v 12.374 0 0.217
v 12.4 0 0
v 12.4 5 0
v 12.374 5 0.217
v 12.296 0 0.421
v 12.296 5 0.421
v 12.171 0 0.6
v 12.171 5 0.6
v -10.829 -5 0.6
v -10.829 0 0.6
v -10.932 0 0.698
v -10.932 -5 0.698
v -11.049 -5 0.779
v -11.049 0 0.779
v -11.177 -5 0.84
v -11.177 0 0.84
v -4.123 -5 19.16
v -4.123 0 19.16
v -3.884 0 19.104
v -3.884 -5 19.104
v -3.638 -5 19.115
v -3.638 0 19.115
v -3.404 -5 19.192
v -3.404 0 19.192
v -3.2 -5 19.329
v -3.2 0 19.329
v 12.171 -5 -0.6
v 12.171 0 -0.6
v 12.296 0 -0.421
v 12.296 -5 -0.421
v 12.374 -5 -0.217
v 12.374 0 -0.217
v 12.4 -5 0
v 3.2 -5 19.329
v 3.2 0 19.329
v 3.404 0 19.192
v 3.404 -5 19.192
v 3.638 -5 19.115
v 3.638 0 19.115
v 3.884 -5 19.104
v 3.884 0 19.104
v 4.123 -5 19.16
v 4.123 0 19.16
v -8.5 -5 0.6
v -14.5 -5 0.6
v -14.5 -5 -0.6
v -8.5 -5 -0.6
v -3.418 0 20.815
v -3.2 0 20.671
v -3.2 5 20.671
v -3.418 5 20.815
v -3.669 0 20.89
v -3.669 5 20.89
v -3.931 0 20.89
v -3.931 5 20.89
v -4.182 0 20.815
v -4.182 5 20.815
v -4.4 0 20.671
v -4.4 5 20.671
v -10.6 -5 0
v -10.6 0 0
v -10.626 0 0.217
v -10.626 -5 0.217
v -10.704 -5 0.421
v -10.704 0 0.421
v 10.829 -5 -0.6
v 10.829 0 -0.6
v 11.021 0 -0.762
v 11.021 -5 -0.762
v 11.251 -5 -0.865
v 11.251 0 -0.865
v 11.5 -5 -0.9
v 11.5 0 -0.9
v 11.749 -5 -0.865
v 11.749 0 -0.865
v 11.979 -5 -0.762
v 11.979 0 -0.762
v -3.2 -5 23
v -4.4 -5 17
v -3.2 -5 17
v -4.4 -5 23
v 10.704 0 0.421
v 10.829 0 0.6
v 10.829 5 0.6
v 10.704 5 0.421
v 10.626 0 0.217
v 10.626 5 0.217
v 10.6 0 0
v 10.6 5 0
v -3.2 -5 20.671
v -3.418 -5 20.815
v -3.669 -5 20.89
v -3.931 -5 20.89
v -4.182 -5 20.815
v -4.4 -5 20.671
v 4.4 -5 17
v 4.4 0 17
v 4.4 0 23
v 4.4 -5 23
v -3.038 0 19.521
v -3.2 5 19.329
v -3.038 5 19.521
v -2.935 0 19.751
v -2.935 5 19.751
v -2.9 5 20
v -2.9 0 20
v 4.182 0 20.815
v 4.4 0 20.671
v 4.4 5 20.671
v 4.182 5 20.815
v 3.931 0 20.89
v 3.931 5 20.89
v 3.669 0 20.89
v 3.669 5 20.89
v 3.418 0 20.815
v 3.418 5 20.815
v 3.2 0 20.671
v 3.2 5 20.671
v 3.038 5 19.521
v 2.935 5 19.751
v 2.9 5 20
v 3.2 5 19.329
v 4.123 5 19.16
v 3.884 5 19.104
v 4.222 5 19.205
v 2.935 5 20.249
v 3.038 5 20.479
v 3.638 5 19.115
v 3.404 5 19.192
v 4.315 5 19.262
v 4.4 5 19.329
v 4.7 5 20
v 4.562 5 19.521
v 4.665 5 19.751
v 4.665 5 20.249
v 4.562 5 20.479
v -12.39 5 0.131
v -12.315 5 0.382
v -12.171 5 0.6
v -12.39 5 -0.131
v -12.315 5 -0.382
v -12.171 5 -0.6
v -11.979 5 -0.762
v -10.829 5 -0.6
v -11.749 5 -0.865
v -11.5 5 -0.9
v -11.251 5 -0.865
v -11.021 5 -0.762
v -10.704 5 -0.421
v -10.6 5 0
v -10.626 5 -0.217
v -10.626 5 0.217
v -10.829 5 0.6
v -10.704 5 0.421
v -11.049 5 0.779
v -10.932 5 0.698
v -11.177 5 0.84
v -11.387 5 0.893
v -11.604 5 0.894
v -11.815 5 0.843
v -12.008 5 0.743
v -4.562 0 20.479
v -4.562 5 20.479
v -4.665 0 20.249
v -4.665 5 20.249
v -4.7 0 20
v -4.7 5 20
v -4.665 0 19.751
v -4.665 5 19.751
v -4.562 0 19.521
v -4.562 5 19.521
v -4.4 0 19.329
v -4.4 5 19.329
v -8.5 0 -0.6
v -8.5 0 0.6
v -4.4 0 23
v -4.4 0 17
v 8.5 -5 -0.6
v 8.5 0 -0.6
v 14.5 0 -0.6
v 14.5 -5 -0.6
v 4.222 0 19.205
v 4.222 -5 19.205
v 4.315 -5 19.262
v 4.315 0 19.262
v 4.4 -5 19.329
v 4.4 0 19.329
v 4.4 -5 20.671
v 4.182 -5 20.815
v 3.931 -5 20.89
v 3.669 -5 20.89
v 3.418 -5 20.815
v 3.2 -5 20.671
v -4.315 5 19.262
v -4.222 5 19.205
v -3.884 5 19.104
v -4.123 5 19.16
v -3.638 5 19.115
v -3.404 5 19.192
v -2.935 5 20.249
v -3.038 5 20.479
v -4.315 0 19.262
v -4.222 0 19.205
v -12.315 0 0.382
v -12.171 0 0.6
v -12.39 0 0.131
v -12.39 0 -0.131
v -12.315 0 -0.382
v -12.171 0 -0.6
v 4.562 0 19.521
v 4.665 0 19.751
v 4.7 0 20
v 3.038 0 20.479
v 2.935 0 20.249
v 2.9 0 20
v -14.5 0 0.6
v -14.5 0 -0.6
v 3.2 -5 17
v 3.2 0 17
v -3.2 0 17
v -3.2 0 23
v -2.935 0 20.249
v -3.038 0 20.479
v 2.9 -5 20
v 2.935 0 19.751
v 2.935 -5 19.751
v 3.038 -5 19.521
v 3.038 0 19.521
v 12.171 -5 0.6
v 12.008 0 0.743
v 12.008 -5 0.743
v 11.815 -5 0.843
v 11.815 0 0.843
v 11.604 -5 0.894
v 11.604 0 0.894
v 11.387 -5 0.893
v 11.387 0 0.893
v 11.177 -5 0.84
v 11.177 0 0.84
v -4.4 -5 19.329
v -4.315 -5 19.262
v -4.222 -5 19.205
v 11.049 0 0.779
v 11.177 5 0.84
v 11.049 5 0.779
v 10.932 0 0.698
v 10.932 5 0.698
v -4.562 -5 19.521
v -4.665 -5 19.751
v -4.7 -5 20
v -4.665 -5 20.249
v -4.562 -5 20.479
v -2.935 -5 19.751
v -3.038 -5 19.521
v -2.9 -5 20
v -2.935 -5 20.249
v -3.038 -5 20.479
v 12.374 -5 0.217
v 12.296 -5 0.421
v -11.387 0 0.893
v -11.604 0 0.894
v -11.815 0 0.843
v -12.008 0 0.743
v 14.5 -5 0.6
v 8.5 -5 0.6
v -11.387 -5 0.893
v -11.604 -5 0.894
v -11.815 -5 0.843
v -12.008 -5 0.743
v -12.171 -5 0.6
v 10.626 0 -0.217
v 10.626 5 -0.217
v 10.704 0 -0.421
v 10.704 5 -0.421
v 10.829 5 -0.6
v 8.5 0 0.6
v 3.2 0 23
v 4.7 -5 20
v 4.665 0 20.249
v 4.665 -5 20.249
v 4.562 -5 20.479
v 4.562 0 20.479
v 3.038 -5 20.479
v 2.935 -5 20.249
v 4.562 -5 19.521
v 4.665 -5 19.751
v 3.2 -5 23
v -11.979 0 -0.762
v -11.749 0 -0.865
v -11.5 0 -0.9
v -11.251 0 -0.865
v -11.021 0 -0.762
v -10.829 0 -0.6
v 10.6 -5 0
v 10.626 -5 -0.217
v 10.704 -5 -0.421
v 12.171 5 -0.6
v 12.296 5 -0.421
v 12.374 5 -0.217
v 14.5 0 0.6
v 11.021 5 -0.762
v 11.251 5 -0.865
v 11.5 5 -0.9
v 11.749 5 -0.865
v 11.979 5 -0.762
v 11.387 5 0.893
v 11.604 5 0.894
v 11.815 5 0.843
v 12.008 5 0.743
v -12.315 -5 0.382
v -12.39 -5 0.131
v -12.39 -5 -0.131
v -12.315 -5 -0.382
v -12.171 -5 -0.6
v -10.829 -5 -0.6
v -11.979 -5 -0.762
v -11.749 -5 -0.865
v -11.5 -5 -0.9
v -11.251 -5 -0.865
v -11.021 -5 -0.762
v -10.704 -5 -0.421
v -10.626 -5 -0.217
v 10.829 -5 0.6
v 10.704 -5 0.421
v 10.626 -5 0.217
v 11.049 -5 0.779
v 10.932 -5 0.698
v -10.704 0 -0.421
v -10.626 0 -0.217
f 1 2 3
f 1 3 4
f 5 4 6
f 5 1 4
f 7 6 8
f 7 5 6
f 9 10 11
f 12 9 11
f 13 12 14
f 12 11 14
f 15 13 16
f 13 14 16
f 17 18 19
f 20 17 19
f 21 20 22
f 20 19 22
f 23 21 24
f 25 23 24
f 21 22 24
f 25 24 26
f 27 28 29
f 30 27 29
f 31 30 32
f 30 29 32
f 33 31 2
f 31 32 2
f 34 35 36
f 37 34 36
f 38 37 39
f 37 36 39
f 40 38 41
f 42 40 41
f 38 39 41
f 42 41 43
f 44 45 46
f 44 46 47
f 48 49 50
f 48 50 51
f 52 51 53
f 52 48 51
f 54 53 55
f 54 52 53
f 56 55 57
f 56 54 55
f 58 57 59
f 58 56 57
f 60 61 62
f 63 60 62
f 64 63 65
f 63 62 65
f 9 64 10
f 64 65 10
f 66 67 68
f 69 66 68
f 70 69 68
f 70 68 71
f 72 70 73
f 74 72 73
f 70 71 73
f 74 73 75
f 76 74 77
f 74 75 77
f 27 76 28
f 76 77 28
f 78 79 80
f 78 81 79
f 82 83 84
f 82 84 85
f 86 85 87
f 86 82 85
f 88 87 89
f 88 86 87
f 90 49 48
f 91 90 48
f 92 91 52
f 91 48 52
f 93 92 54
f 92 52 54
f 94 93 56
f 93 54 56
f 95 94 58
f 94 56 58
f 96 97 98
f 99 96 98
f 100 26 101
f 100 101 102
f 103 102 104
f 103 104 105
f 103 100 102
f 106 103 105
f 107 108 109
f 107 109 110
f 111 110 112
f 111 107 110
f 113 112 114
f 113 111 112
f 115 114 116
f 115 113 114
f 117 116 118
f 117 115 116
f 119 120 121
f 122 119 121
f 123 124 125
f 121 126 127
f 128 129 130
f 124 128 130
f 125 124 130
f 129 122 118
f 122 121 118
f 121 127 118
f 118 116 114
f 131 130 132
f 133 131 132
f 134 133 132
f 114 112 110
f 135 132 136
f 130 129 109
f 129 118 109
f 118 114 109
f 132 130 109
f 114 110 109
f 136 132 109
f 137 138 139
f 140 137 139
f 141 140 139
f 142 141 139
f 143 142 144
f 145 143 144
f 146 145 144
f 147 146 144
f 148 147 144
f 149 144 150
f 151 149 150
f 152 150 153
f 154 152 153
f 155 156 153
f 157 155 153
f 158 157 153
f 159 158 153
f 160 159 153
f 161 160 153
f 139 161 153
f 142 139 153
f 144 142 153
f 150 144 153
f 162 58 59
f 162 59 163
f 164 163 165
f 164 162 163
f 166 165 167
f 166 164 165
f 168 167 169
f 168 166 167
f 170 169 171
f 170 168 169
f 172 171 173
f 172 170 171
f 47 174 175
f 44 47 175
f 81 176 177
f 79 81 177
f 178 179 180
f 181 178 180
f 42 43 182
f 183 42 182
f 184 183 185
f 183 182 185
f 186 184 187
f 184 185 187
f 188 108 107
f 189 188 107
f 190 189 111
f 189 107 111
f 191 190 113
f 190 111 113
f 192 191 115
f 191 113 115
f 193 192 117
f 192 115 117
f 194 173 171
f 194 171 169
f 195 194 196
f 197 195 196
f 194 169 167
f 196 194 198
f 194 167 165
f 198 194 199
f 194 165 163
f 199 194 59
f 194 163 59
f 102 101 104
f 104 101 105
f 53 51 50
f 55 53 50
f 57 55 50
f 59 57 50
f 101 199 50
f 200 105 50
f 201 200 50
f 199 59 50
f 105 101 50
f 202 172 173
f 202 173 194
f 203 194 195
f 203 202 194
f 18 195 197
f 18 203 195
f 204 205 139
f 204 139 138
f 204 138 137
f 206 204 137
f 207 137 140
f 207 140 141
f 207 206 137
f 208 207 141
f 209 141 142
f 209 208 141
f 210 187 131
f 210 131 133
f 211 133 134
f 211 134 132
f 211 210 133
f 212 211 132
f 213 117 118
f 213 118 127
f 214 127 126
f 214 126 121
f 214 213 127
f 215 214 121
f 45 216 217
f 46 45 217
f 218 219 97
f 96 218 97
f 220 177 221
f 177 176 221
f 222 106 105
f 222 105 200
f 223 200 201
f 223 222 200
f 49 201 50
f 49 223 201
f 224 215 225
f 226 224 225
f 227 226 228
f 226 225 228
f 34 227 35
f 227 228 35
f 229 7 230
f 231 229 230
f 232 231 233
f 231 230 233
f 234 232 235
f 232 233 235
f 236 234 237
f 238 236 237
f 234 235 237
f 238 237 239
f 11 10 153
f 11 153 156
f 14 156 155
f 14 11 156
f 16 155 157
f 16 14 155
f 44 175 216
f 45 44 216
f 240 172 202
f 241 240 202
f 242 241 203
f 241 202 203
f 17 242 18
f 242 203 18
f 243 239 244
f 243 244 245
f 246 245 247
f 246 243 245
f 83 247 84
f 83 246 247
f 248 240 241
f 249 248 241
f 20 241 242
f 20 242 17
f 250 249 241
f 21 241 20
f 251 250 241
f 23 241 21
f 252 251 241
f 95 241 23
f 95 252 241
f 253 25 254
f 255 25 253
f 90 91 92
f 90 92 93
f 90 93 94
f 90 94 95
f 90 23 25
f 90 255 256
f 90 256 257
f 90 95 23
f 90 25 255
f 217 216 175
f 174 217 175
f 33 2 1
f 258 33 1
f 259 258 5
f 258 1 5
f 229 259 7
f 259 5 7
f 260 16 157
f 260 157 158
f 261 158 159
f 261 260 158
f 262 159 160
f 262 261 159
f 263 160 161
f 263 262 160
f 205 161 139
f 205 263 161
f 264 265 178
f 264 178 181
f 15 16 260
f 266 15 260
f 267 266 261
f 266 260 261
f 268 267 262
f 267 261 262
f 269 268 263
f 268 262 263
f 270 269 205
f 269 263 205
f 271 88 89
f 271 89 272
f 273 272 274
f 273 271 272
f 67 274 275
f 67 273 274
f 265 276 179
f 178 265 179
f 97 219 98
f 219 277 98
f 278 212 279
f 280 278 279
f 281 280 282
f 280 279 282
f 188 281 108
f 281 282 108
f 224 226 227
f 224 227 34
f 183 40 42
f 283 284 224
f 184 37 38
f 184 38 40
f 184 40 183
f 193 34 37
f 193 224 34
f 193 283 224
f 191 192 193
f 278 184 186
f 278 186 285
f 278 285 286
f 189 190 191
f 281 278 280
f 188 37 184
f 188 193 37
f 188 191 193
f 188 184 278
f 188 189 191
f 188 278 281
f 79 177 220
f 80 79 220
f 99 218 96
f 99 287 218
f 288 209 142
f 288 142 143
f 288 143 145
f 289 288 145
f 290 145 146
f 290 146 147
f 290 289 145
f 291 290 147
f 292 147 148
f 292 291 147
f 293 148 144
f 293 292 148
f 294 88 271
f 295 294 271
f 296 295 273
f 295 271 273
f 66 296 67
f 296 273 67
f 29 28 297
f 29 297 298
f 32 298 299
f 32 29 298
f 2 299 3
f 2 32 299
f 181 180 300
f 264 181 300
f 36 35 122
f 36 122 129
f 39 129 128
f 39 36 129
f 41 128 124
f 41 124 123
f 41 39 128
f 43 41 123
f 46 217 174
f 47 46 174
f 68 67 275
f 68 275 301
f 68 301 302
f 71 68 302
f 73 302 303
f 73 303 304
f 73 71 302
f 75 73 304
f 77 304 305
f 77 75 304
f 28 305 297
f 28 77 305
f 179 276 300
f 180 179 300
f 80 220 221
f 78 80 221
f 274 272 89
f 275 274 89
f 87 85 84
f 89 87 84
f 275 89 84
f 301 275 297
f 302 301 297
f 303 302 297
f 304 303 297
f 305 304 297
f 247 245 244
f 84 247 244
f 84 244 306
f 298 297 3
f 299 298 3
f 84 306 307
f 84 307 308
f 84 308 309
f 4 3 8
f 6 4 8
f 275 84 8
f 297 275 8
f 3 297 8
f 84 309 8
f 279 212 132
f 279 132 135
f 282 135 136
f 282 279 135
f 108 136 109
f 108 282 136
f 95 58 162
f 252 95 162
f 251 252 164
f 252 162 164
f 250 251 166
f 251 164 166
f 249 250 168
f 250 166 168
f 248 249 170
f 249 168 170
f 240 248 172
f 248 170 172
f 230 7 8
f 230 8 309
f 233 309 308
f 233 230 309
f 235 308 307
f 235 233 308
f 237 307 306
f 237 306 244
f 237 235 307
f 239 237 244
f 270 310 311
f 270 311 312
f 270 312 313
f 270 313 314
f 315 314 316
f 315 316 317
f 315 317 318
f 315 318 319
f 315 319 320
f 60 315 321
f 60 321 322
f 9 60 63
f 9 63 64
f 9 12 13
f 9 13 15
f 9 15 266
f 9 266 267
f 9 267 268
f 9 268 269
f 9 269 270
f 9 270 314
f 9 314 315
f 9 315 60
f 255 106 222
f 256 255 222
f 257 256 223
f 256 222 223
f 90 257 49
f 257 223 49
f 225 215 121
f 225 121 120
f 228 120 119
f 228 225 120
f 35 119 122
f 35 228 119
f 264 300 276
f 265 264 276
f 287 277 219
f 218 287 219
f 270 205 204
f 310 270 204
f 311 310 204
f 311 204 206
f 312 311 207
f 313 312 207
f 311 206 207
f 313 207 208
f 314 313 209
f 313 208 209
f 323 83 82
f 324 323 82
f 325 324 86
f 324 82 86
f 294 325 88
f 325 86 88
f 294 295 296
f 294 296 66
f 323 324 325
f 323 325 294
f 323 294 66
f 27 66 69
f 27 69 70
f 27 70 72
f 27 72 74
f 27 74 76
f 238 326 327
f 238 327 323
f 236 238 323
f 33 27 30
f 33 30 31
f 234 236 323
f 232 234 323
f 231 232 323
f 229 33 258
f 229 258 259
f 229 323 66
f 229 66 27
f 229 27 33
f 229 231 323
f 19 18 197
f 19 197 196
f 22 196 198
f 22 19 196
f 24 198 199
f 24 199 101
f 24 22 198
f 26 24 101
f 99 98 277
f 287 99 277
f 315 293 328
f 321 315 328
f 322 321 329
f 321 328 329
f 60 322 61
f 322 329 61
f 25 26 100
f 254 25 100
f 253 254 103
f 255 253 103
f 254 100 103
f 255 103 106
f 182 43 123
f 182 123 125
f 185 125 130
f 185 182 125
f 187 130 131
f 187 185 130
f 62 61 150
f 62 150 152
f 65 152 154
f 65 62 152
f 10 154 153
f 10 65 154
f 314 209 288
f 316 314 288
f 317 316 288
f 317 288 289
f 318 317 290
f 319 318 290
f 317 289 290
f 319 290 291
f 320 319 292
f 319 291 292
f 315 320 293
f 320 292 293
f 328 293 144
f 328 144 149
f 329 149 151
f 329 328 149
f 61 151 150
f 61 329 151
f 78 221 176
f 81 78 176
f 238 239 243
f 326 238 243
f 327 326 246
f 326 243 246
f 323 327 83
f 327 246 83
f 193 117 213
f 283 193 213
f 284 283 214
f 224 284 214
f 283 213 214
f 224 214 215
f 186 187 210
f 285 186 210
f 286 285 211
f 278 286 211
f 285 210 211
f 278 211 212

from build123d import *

# Parameters (mm, degrees)
F1_DEPTH      = 5
F1_DEPTH_BACK = 5
F2_DEPTH      = 5


with BuildPart() as f1:
    # F0 (on Front) → F1 (new body, two sides)
    with BuildSketch(Plane.XZ) as f1_sk:
        with BuildLine():
            Line((-3.8, 20), (-3.2, 20))
            Line((-3.2, 20), (-3.2, 20.6708203932))
            ThreePointArc((-3.2, 20.6708203932), (-3.8, 20.9), (-4.4, 20.6708203932))
            Line((-4.4, 20.6708203932), (-4.4, 19.3291796068))
            ThreePointArc((-4.4, 19.3291796068), (-4.2693578785, 19.2320786617), (-4.123362564, 19.1600972364))
            Line((-4.123362564, 19.1600972364), (-3.8, 20))
        make_face()
        with BuildLine():
            Line((-3.2, 19.3291796068), (-3.2, 20))
            Line((-3.2, 20), (-3.8, 20))
            Line((-3.8, 20), (-4.123362564, 19.1600972364))
            ThreePointArc((-4.123362564, 19.1600972364), (-3.6378911485, 19.1147199764), (-3.2, 19.3291796068))
        make_face()
        with BuildLine():
            Line((-4.4, 19.3291796068), (-4.4, 20.6708203932))
            ThreePointArc((-4.4, 20.6708203932), (-4.7, 20), (-4.4, 19.3291796068))
        make_face()
        with BuildLine():
            Line((-3.2, 20), (-2.9, 20))
            ThreePointArc((-2.9, 20), (-2.9784161637, 20.3674234614), (-3.2, 20.6708203932))
            Line((-3.2, 20.6708203932), (-3.2, 20))
        make_face()
        with BuildLine():
            ThreePointArc((-3.2, 19.3291796068), (-2.9784161637, 19.6325765386), (-2.9, 20))
            Line((-2.9, 20), (-3.2, 20))
            Line((-3.2, 20), (-3.2, 19.3291796068))
        make_face()
    extrude(amount=-F1_DEPTH)
    extrude(f1_sk.sketch, amount=F1_DEPTH_BACK)


with BuildPart() as f1b:
    # F0 (on Front) → F1, piece 2 (new body, two sides)
    with BuildSketch(Plane.XZ) as f1_2_sk:
        with BuildLine():
            Line((3.2, 20.6708203932), (3.2, 20))
            Line((3.2, 20), (3.8, 20))
            Line((3.8, 20), (4.123362564, 19.1600972364))
            ThreePointArc((4.123362564, 19.1600972364), (4.2693578785, 19.2320786617), (4.4, 19.3291796068))
            Line((4.4, 19.3291796068), (4.4, 20.6708203932))
            ThreePointArc((4.4, 20.6708203932), (3.8, 20.9), (3.2, 20.6708203932))
        make_face()
        with BuildLine():
            Line((3.8, 20), (3.2, 20))
            Line((3.2, 20), (3.2, 19.3291796068))
            ThreePointArc((3.2, 19.3291796068), (3.6378911485, 19.1147199764), (4.123362564, 19.1600972364))
            Line((4.123362564, 19.1600972364), (3.8, 20))
        make_face()
        with BuildLine():
            ThreePointArc((4.7, 20), (4.6215838363, 20.3674234614), (4.4, 20.6708203932))
            Line((4.4, 20.6708203932), (4.4, 19.3291796068))
            ThreePointArc((4.4, 19.3291796068), (4.6215838363, 19.6325765386), (4.7, 20))
        make_face()
        with BuildLine():
            ThreePointArc((3.2, 20.6708203932), (2.9784161637, 20.3674234614), (2.9, 20))
            Line((2.9, 20), (3.2, 20))
            Line((3.2, 20), (3.2, 20.6708203932))
        make_face()
        with BuildLine():
            Line((3.2, 20), (2.9, 20))
            ThreePointArc((2.9, 20), (2.9784161637, 19.6325765386), (3.2, 19.3291796068))
            Line((3.2, 19.3291796068), (3.2, 20))
        make_face()
    extrude(amount=-F1_DEPTH)
    extrude(f1_2_sk.sketch, amount=F1_DEPTH_BACK)


with BuildPart() as f1c:
    # F0 (on Front) → F1, piece 3 (new body, two sides)
    with BuildSketch(Plane.XZ) as f1_3_sk:
        with BuildLine():
            Line((-11.5, 0), (-11.269, 0.6))
            Line((-11.269, 0.6), (-12.1708203932, 0.6))
            ThreePointArc((-12.1708203932, 0.6), (-12.4, 0), (-12.1708203932, -0.6))
            Line((-12.1708203932, -0.6), (-10.8291796068, -0.6))
            ThreePointArc((-10.8291796068, -0.6), (-10.6592448769, -0.3211398808), (-10.6, 0))
            Line((-10.6, 0), (-11.5, 0))
        make_face()
        with BuildLine():
            Line((-10.8291796068, 0.6), (-11.269, 0.6))
            Line((-11.269, 0.6), (-11.5, 0))
            Line((-11.5, 0), (-10.6, 0))
            ThreePointArc((-10.6, 0), (-10.6592448769, 0.3211398808), (-10.8291796068, 0.6))
        make_face()
        with BuildLine():
            Line((-10.8291796068, -0.6), (-12.1708203932, -0.6))
            ThreePointArc((-12.1708203932, -0.6), (-11.5, -0.9), (-10.8291796068, -0.6))
        make_face()
        with BuildLine():
            Line((-11.269, 0.6), (-11.176637436, 0.8399027636))
            ThreePointArc((-11.176637436, 0.8399027636), (-11.7111162471, 0.8748885245), (-12.1708203932, 0.6))
            Line((-12.1708203932, 0.6), (-11.269, 0.6))
        make_face()
        with BuildLine():
            ThreePointArc((-10.8291796068, 0.6), (-10.9886407602, 0.7406157762), (-11.176637436, 0.8399027636))
            Line((-11.176637436, 0.8399027636), (-11.269, 0.6))
            Line((-11.269, 0.6), (-10.8291796068, 0.6))
        make_face()
    extrude(amount=-F1_DEPTH)
    extrude(f1_3_sk.sketch, amount=F1_DEPTH_BACK)


with BuildPart() as f1d:
    # F0 (on Front) → F1, piece 4 (new body, two sides)
    with BuildSketch(Plane.XZ) as f1_4_sk:
        with BuildLine():
            Line((12.1708203932, 0.6), (11.269, 0.6))
            Line((11.269, 0.6), (11.5, 0))
            Line((11.5, 0), (10.6, 0))
            ThreePointArc((10.6, 0), (10.6592448769, -0.3211398808), (10.8291796068, -0.6))
            Line((10.8291796068, -0.6), (12.1708203932, -0.6))
            ThreePointArc((12.1708203932, -0.6), (12.3407551231, -0.3211398808), (12.4, 0))
            ThreePointArc((12.4, 0), (12.3407551231, 0.3211398808), (12.1708203932, 0.6))
        make_face()
        with BuildLine():
            Line((11.5, 0), (11.269, 0.6))
            Line((11.269, 0.6), (10.8291796068, 0.6))
            ThreePointArc((10.8291796068, 0.6), (10.6592448769, 0.3211398808), (10.6, 0))
            Line((10.6, 0), (11.5, 0))
        make_face()
        with BuildLine():
            ThreePointArc((12.1708203932, 0.6), (11.7111162471, 0.8748885245), (11.176637436, 0.8399027636))
            Line((11.176637436, 0.8399027636), (11.269, 0.6))
            Line((11.269, 0.6), (12.1708203932, 0.6))
        make_face()
        with BuildLine():
            Line((11.269, 0.6), (11.176637436, 0.8399027636))
            ThreePointArc((11.176637436, 0.8399027636), (10.9886407602, 0.7406157762), (10.8291796068, 0.6))
            Line((10.8291796068, 0.6), (11.269, 0.6))
        make_face()
        with BuildLine():
            ThreePointArc((10.8291796068, -0.6), (11.5, -0.9), (12.1708203932, -0.6))
            Line((12.1708203932, -0.6), (10.8291796068, -0.6))
        make_face()
    extrude(amount=-F1_DEPTH)
    extrude(f1_4_sk.sketch, amount=F1_DEPTH_BACK)


with BuildPart() as f2:
    # F0 (on Front) → F2 (new body)
    with BuildSketch(Plane.XZ):
        with BuildLine():
            ThreePointArc((-13.6166010489, -0.6), (-13.7, 0), (-13.6166010489, 0.6))
            Line((-13.6166010489, 0.6), (-14.5, 0.6))
            Line((-14.5, 0.6), (-14.5, -0.6))
            Line((-14.5, -0.6), (-13.6166010489, -0.6))
        make_face()
        with BuildLine():
            Line((-12.1708203932, 0.6), (-13.6166010489, 0.6))
            ThreePointArc((-13.6166010489, 0.6), (-13.7, 0), (-13.6166010489, -0.6))
            Line((-13.6166010489, -0.6), (-12.1708203932, -0.6))
            ThreePointArc((-12.1708203932, -0.6), (-12.4, 0), (-12.1708203932, 0.6))
        make_face()
        with BuildLine():
            Line((-11.5, 0), (-11.269, 0.6))
            Line((-11.269, 0.6), (-12.1708203932, 0.6))
            ThreePointArc((-12.1708203932, 0.6), (-12.4, 0), (-12.1708203932, -0.6))
            Line((-12.1708203932, -0.6), (-10.8291796068, -0.6))
            ThreePointArc((-10.8291796068, -0.6), (-10.6592448769, -0.3211398808), (-10.6, 0))
            Line((-10.6, 0), (-11.5, 0))
        make_face()
        with BuildLine():
            ThreePointArc((-9.3, 0), (-9.3209494834, 0.3028842126), (-9.3833989511, 0.6))
            Line((-9.3833989511, 0.6), (-10.8291796068, 0.6))
            ThreePointArc((-10.8291796068, 0.6), (-10.6592448769, 0.3211398808), (-10.6, 0))
            Line((-10.6, 0), (-9.3, 0))
        make_face()
        with BuildLine():
            ThreePointArc((-9.3833989511, -0.6), (-9.3209494834, -0.3028842126), (-9.3, 0))
            Line((-9.3, 0), (-10.6, 0))
            ThreePointArc((-10.6, 0), (-10.6592448769, -0.3211398808), (-10.8291796068, -0.6))
            Line((-10.8291796068, -0.6), (-9.3833989511, -0.6))
        make_face()
        with BuildLine():
            Line((-8.5, 0), (-9.3, 0))
            ThreePointArc((-9.3, 0), (-9.3209494834, -0.3028842126), (-9.3833989511, -0.6))
            Line((-9.3833989511, -0.6), (-8.5, -0.6))
            Line((-8.5, -0.6), (-8.5, 0))
        make_face()
        with BuildLine():
            Line((-8.5, 0.6), (-9.3833989511, 0.6))
            ThreePointArc((-9.3833989511, 0.6), (-9.3209494834, 0.3028842126), (-9.3, 0))
            Line((-9.3, 0), (-8.5, 0))
            Line((-8.5, 0), (-8.5, 0.6))
        make_face()
        with BuildLine():
            Line((-10.8291796068, 0.6), (-11.269, 0.6))
            Line((-11.269, 0.6), (-11.5, 0))
            Line((-11.5, 0), (-10.6, 0))
            ThreePointArc((-10.6, 0), (-10.6592448769, 0.3211398808), (-10.8291796068, 0.6))
        make_face()
    extrude(amount=F2_DEPTH)


with BuildPart() as f2b:
    # F0 (on Front) → F2, piece 2 (new body)
    with BuildSketch(Plane.XZ):
        with BuildLine():
            ThreePointArc((9.3, 0), (9.3209494834, 0.3028842126), (9.3833989511, 0.6))
            Line((9.3833989511, 0.6), (8.5, 0.6))
            Line((8.5, 0.6), (8.5, 0))
            Line((8.5, 0), (9.3, 0))
        make_face()
        with BuildLine():
            ThreePointArc((9.3833989511, -0.6), (9.3209494834, -0.3028842126), (9.3, 0))
            Line((9.3, 0), (8.5, 0))
            Line((8.5, 0), (8.5, -0.6))
            Line((8.5, -0.6), (9.3833989511, -0.6))
        make_face()
        with BuildLine():
            Line((10.6, 0), (9.3, 0))
            ThreePointArc((9.3, 0), (9.3209494834, -0.3028842126), (9.3833989511, -0.6))
            Line((9.3833989511, -0.6), (10.8291796068, -0.6))
            ThreePointArc((10.8291796068, -0.6), (10.6592448769, -0.3211398808), (10.6, 0))
        make_face()
        with BuildLine():
            Line((10.8291796068, 0.6), (9.3833989511, 0.6))
            ThreePointArc((9.3833989511, 0.6), (9.3209494834, 0.3028842126), (9.3, 0))
            Line((9.3, 0), (10.6, 0))
            ThreePointArc((10.6, 0), (10.6592448769, 0.3211398808), (10.8291796068, 0.6))
        make_face()
        with BuildLine():
            Line((11.5, 0), (11.269, 0.6))
            Line((11.269, 0.6), (10.8291796068, 0.6))
            ThreePointArc((10.8291796068, 0.6), (10.6592448769, 0.3211398808), (10.6, 0))
            Line((10.6, 0), (11.5, 0))
        make_face()
        with BuildLine():
            Line((12.1708203932, 0.6), (11.269, 0.6))
            Line((11.269, 0.6), (11.5, 0))
            Line((11.5, 0), (10.6, 0))
            ThreePointArc((10.6, 0), (10.6592448769, -0.3211398808), (10.8291796068, -0.6))
            Line((10.8291796068, -0.6), (12.1708203932, -0.6))
            ThreePointArc((12.1708203932, -0.6), (12.3407551231, -0.3211398808), (12.4, 0))
            ThreePointArc((12.4, 0), (12.3407551231, 0.3211398808), (12.1708203932, 0.6))
        make_face()
        with BuildLine():
            ThreePointArc((13.7, 0), (13.6790505166, 0.3028842126), (13.6166010489, 0.6))
            Line((13.6166010489, 0.6), (12.1708203932, 0.6))
            ThreePointArc((12.1708203932, 0.6), (12.3407551231, 0.3211398808), (12.4, 0))
            ThreePointArc((12.4, 0), (12.3407551231, -0.3211398808), (12.1708203932, -0.6))
            Line((12.1708203932, -0.6), (13.6166010489, -0.6))
            ThreePointArc((13.6166010489, -0.6), (13.6790505166, -0.3028842126), (13.7, 0))
        make_face()
        with BuildLine():
            Line((14.5, 0.6), (13.6166010489, 0.6))
            ThreePointArc((13.6166010489, 0.6), (13.6790505166, 0.3028842126), (13.7, 0))
            ThreePointArc((13.7, 0), (13.6790505166, -0.3028842126), (13.6166010489, -0.6))
            Line((13.6166010489, -0.6), (14.5, -0.6))
            Line((14.5, -0.6), (14.5, 0.6))
        make_face()
    extrude(amount=F2_DEPTH)


with BuildPart() as f2c:
    # F0 (on Front) → F2, piece 3 (new body)
    with BuildSketch(Plane.XZ):
        with BuildLine():
            ThreePointArc((4.4, 17.8833989511), (3.8, 17.8), (3.2, 17.8833989511))
            Line((3.2, 17.8833989511), (3.2, 17))
            Line((3.2, 17), (4.4, 17))
            Line((4.4, 17), (4.4, 17.8833989511))
        make_face()
        with BuildLine():
            Line((3.2, 19.3291796068), (3.2, 17.8833989511))
            ThreePointArc((3.2, 17.8833989511), (3.8, 17.8), (4.4, 17.8833989511))
            Line((4.4, 17.8833989511), (4.4, 18.4415584416))
            Line((4.4, 18.4415584416), (4.123362564, 19.1600972364))
            ThreePointArc((4.123362564, 19.1600972364), (3.6378911485, 19.1147199764), (3.2, 19.3291796068))
        make_face()
        with BuildLine():
            Line((3.8, 20), (3.2, 20))
            Line((3.2, 20), (3.2, 19.3291796068))
            ThreePointArc((3.2, 19.3291796068), (3.6378911485, 19.1147199764), (4.123362564, 19.1600972364))
            Line((4.123362564, 19.1600972364), (3.8, 20))
        make_face()
        with BuildLine():
            ThreePointArc((4.4, 19.3291796068), (4.2693578785, 19.2320786617), (4.123362564, 19.1600972364))
            Line((4.123362564, 19.1600972364), (4.4, 18.4415584416))
            Line((4.4, 18.4415584416), (4.4, 19.3291796068))
        make_face()
        with BuildLine():
            Line((3.2, 20.6708203932), (3.2, 20))
            Line((3.2, 20), (3.8, 20))
            Line((3.8, 20), (4.123362564, 19.1600972364))
            ThreePointArc((4.123362564, 19.1600972364), (4.2693578785, 19.2320786617), (4.4, 19.3291796068))
            Line((4.4, 19.3291796068), (4.4, 20.6708203932))
            ThreePointArc((4.4, 20.6708203932), (3.8, 20.9), (3.2, 20.6708203932))
        make_face()
        with BuildLine():
            ThreePointArc((4.4, 22.1166010489), (3.8, 22.2), (3.2, 22.1166010489))
            Line((3.2, 22.1166010489), (3.2, 20.6708203932))
            ThreePointArc((3.2, 20.6708203932), (3.8, 20.9), (4.4, 20.6708203932))
            Line((4.4, 20.6708203932), (4.4, 22.1166010489))
        make_face()
        with BuildLine():
            Line((3.2, 23), (3.2, 22.1166010489))
            ThreePointArc((3.2, 22.1166010489), (3.8, 22.2), (4.4, 22.1166010489))
            Line((4.4, 22.1166010489), (4.4, 23))
            Line((4.4, 23), (3.2, 23))
        make_face()
    extrude(amount=F2_DEPTH)


with BuildPart() as f2d:
    # F0 (on Front) → F2, piece 4 (new body)
    with BuildSketch(Plane.XZ):
        with BuildLine():
            Line((-3.2, 17.8833989511), (-3.2, 19.3291796068))
            ThreePointArc((-3.2, 19.3291796068), (-3.6378911485, 19.1147199764), (-4.123362564, 19.1600972364))
            Line((-4.123362564, 19.1600972364), (-4.4, 18.4415584416))
            Line((-4.4, 18.4415584416), (-4.4, 17.8833989511))
            ThreePointArc((-4.4, 17.8833989511), (-3.8, 17.8), (-3.2, 17.8833989511))
        make_face()
        with BuildLine():
            Line((-3.2, 17), (-3.2, 17.8833989511))
            ThreePointArc((-3.2, 17.8833989511), (-3.8, 17.8), (-4.4, 17.8833989511))
            Line((-4.4, 17.8833989511), (-4.4, 17))
            Line((-4.4, 17), (-3.2, 17))
        make_face()
        with BuildLine():
            Line((-4.4, 18.4415584416), (-4.123362564, 19.1600972364))
            ThreePointArc((-4.123362564, 19.1600972364), (-4.2693578785, 19.2320786617), (-4.4, 19.3291796068))
            Line((-4.4, 19.3291796068), (-4.4, 18.4415584416))
        make_face()
        with BuildLine():
            Line((-3.8, 20), (-3.2, 20))
            Line((-3.2, 20), (-3.2, 20.6708203932))
            ThreePointArc((-3.2, 20.6708203932), (-3.8, 20.9), (-4.4, 20.6708203932))
            Line((-4.4, 20.6708203932), (-4.4, 19.3291796068))
            ThreePointArc((-4.4, 19.3291796068), (-4.2693578785, 19.2320786617), (-4.123362564, 19.1600972364))
            Line((-4.123362564, 19.1600972364), (-3.8, 20))
        make_face()
        with BuildLine():
            Line((-3.2, 19.3291796068), (-3.2, 20))
            Line((-3.2, 20), (-3.8, 20))
            Line((-3.8, 20), (-4.123362564, 19.1600972364))
            ThreePointArc((-4.123362564, 19.1600972364), (-3.6378911485, 19.1147199764), (-3.2, 19.3291796068))
        make_face()
        with BuildLine():
            ThreePointArc((-4.4, 20.6708203932), (-3.8, 20.9), (-3.2, 20.6708203932))
            Line((-3.2, 20.6708203932), (-3.2, 22.1166010489))
            ThreePointArc((-3.2, 22.1166010489), (-3.8, 22.2), (-4.4, 22.1166010489))
            Line((-4.4, 22.1166010489), (-4.4, 20.6708203932))
        make_face()
        with BuildLine():
            ThreePointArc((-4.4, 22.1166010489), (-3.8, 22.2), (-3.2, 22.1166010489))
            Line((-3.2, 22.1166010489), (-3.2, 23))
            Line((-3.2, 23), (-4.4, 23))
            Line((-4.4, 23), (-4.4, 22.1166010489))
        make_face()
    extrude(amount=F2_DEPTH)


solid = Compound([f1.part, f1b.part, f1c.part, f1d.part, f2.part, f2b.part, f2c.part, f2d.part])
